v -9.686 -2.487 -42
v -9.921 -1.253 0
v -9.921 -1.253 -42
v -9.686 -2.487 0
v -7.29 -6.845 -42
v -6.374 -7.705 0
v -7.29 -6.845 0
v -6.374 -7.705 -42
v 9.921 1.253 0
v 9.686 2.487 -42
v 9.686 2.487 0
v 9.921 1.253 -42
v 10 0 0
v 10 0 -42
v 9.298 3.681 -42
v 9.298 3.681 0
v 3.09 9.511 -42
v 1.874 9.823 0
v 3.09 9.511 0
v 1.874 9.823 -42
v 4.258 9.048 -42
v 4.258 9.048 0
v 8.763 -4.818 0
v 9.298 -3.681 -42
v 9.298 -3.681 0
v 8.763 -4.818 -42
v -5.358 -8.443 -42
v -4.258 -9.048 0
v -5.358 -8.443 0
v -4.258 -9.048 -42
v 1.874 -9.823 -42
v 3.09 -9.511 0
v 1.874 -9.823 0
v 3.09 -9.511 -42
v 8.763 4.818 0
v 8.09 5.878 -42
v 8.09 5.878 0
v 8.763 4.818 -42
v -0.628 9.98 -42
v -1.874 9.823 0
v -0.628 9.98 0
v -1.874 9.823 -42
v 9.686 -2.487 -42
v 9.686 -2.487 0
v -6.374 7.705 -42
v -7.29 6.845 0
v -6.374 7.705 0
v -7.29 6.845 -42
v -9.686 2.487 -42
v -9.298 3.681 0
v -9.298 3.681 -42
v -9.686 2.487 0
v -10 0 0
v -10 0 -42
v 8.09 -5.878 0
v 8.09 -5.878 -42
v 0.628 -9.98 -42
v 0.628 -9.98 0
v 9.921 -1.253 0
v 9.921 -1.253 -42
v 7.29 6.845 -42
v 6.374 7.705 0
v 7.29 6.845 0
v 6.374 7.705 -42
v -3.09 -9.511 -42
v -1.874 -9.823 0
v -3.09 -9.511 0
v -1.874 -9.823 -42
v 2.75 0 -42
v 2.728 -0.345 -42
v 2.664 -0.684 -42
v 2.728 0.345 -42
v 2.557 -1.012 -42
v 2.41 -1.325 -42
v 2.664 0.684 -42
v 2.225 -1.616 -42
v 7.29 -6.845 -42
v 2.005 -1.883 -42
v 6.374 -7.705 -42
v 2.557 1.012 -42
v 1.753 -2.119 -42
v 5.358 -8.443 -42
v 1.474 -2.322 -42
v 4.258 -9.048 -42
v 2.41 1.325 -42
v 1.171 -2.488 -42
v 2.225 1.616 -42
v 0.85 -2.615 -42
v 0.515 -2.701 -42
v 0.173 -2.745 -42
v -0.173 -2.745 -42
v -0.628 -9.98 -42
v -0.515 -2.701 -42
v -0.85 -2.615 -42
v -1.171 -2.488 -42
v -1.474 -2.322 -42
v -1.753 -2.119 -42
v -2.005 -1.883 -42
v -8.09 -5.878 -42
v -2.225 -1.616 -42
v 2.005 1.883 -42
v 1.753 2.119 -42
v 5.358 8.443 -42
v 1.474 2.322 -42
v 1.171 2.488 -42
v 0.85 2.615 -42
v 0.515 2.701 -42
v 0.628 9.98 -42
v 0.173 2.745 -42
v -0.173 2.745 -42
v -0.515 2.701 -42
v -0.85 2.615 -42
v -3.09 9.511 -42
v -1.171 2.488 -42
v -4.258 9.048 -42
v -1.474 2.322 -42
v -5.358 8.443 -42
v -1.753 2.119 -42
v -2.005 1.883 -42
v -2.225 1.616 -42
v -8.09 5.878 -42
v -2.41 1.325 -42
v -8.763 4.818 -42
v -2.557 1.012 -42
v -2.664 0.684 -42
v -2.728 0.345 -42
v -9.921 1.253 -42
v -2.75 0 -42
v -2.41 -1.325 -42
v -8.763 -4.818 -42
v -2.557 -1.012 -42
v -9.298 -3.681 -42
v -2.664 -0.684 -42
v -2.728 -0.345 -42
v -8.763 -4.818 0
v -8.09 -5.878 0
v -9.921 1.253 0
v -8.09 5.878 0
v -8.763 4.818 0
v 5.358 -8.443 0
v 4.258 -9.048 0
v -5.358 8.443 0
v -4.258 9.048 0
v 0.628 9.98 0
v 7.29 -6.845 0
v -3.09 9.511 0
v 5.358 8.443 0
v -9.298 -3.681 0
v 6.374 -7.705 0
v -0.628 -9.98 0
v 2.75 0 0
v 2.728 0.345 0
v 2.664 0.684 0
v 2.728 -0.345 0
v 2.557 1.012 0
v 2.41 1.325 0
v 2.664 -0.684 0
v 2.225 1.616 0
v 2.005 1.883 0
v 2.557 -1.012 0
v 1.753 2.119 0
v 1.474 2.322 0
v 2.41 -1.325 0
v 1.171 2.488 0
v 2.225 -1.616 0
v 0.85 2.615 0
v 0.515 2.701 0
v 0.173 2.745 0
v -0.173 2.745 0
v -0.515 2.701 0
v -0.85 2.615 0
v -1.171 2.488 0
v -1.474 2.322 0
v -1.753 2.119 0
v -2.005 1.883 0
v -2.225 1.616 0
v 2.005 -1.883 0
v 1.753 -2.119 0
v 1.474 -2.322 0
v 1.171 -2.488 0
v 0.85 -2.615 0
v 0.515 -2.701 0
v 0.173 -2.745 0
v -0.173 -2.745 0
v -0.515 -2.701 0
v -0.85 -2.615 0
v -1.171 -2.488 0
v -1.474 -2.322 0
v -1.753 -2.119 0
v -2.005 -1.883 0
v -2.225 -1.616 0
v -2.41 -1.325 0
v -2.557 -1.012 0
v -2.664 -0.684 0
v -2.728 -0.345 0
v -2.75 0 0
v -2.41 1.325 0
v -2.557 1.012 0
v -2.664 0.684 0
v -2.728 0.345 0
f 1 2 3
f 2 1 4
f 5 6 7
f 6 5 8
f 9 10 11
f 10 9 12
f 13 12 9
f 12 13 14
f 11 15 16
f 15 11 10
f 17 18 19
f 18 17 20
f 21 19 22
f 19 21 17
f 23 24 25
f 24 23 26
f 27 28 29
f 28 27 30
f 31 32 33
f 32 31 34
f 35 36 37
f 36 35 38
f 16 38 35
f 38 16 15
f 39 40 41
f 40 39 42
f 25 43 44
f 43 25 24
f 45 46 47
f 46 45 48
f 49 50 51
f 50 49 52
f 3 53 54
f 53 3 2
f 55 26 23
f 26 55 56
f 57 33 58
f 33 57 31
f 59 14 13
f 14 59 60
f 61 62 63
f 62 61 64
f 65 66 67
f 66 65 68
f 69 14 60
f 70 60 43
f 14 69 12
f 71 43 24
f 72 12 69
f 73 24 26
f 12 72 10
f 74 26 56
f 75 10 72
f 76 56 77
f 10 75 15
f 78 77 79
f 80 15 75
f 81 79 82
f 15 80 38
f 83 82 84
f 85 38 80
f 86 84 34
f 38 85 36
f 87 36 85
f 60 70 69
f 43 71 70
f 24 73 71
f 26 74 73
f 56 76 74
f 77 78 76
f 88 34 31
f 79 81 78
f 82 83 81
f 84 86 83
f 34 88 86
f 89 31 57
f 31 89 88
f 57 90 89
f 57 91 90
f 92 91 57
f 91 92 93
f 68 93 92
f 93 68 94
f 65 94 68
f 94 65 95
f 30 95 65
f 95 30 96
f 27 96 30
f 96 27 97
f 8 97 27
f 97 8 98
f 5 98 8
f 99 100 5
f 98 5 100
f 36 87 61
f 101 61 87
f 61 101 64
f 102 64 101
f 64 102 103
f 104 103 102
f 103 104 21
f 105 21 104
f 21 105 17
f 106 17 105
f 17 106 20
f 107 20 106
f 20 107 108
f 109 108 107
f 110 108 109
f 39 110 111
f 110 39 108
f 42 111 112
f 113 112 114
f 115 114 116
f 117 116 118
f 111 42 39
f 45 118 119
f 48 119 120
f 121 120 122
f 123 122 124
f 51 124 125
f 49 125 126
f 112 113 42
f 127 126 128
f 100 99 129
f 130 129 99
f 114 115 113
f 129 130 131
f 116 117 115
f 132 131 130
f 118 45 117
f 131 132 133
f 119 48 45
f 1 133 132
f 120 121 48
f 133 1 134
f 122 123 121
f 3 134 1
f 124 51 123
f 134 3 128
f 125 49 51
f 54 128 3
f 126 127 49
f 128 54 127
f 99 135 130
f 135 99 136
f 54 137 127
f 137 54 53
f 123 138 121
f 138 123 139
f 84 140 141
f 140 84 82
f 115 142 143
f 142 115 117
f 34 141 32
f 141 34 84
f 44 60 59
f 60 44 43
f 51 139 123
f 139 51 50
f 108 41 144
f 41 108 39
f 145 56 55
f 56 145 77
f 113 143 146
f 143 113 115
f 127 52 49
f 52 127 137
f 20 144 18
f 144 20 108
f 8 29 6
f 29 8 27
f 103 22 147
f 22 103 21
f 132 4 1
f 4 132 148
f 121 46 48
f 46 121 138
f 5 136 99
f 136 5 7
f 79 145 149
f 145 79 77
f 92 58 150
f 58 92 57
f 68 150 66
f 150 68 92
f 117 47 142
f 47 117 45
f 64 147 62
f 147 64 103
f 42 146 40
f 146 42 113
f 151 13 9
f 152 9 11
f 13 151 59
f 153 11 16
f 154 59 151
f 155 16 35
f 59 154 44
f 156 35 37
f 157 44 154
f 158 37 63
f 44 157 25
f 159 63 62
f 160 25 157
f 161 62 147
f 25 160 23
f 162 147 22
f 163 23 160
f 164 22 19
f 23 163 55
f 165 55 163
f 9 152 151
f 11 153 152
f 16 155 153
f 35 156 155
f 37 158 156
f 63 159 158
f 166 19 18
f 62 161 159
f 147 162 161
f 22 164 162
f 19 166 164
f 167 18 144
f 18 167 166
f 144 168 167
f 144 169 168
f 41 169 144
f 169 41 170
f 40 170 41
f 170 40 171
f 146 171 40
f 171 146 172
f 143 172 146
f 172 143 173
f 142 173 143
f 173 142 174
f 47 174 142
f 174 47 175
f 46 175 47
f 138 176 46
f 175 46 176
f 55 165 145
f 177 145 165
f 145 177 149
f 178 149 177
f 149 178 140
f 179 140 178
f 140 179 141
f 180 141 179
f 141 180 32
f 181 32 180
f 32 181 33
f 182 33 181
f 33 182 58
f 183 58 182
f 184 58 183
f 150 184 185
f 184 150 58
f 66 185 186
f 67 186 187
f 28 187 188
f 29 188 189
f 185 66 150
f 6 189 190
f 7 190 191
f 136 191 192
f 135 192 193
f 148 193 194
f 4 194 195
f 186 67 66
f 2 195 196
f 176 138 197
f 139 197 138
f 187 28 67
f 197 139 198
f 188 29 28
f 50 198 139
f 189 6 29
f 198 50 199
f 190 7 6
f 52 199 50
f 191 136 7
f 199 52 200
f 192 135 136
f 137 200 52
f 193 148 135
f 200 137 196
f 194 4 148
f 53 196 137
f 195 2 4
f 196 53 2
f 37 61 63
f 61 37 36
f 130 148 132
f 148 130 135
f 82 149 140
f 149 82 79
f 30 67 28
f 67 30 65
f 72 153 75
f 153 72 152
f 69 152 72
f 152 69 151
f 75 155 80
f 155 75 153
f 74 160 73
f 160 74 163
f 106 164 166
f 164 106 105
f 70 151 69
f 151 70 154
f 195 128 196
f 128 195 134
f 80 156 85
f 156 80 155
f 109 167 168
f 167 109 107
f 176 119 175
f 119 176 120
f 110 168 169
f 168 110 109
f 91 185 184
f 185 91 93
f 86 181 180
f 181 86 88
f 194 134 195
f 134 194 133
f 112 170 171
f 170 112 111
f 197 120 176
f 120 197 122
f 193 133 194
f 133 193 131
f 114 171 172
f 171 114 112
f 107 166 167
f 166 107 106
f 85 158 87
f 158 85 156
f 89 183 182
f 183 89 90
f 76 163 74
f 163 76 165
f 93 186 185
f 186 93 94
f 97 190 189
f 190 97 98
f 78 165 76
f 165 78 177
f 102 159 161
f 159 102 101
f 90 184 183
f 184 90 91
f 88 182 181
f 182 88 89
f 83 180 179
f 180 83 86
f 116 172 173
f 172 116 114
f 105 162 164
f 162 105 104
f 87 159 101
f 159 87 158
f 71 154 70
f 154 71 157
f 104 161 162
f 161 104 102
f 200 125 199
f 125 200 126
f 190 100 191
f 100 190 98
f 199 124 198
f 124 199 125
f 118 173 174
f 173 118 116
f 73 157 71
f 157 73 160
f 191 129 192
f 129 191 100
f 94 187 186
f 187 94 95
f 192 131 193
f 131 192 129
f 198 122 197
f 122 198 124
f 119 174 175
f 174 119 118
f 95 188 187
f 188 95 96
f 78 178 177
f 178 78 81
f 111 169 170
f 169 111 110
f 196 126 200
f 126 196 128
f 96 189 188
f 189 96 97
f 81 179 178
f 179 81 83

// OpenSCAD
$fn = 50;


difference() {
	union() {
		translate(v = [0, 0, -42.0000000000]) {
			cylinder(h = 42, r = 10.0000000000);
		}
		cylinder(h = 0, r = 16.0000000000);
	}
	union() {
		#translate(v = [0, 0, -42]) {
			cylinder(h = 42, r = 2.7500000000);
		}
	}
}
